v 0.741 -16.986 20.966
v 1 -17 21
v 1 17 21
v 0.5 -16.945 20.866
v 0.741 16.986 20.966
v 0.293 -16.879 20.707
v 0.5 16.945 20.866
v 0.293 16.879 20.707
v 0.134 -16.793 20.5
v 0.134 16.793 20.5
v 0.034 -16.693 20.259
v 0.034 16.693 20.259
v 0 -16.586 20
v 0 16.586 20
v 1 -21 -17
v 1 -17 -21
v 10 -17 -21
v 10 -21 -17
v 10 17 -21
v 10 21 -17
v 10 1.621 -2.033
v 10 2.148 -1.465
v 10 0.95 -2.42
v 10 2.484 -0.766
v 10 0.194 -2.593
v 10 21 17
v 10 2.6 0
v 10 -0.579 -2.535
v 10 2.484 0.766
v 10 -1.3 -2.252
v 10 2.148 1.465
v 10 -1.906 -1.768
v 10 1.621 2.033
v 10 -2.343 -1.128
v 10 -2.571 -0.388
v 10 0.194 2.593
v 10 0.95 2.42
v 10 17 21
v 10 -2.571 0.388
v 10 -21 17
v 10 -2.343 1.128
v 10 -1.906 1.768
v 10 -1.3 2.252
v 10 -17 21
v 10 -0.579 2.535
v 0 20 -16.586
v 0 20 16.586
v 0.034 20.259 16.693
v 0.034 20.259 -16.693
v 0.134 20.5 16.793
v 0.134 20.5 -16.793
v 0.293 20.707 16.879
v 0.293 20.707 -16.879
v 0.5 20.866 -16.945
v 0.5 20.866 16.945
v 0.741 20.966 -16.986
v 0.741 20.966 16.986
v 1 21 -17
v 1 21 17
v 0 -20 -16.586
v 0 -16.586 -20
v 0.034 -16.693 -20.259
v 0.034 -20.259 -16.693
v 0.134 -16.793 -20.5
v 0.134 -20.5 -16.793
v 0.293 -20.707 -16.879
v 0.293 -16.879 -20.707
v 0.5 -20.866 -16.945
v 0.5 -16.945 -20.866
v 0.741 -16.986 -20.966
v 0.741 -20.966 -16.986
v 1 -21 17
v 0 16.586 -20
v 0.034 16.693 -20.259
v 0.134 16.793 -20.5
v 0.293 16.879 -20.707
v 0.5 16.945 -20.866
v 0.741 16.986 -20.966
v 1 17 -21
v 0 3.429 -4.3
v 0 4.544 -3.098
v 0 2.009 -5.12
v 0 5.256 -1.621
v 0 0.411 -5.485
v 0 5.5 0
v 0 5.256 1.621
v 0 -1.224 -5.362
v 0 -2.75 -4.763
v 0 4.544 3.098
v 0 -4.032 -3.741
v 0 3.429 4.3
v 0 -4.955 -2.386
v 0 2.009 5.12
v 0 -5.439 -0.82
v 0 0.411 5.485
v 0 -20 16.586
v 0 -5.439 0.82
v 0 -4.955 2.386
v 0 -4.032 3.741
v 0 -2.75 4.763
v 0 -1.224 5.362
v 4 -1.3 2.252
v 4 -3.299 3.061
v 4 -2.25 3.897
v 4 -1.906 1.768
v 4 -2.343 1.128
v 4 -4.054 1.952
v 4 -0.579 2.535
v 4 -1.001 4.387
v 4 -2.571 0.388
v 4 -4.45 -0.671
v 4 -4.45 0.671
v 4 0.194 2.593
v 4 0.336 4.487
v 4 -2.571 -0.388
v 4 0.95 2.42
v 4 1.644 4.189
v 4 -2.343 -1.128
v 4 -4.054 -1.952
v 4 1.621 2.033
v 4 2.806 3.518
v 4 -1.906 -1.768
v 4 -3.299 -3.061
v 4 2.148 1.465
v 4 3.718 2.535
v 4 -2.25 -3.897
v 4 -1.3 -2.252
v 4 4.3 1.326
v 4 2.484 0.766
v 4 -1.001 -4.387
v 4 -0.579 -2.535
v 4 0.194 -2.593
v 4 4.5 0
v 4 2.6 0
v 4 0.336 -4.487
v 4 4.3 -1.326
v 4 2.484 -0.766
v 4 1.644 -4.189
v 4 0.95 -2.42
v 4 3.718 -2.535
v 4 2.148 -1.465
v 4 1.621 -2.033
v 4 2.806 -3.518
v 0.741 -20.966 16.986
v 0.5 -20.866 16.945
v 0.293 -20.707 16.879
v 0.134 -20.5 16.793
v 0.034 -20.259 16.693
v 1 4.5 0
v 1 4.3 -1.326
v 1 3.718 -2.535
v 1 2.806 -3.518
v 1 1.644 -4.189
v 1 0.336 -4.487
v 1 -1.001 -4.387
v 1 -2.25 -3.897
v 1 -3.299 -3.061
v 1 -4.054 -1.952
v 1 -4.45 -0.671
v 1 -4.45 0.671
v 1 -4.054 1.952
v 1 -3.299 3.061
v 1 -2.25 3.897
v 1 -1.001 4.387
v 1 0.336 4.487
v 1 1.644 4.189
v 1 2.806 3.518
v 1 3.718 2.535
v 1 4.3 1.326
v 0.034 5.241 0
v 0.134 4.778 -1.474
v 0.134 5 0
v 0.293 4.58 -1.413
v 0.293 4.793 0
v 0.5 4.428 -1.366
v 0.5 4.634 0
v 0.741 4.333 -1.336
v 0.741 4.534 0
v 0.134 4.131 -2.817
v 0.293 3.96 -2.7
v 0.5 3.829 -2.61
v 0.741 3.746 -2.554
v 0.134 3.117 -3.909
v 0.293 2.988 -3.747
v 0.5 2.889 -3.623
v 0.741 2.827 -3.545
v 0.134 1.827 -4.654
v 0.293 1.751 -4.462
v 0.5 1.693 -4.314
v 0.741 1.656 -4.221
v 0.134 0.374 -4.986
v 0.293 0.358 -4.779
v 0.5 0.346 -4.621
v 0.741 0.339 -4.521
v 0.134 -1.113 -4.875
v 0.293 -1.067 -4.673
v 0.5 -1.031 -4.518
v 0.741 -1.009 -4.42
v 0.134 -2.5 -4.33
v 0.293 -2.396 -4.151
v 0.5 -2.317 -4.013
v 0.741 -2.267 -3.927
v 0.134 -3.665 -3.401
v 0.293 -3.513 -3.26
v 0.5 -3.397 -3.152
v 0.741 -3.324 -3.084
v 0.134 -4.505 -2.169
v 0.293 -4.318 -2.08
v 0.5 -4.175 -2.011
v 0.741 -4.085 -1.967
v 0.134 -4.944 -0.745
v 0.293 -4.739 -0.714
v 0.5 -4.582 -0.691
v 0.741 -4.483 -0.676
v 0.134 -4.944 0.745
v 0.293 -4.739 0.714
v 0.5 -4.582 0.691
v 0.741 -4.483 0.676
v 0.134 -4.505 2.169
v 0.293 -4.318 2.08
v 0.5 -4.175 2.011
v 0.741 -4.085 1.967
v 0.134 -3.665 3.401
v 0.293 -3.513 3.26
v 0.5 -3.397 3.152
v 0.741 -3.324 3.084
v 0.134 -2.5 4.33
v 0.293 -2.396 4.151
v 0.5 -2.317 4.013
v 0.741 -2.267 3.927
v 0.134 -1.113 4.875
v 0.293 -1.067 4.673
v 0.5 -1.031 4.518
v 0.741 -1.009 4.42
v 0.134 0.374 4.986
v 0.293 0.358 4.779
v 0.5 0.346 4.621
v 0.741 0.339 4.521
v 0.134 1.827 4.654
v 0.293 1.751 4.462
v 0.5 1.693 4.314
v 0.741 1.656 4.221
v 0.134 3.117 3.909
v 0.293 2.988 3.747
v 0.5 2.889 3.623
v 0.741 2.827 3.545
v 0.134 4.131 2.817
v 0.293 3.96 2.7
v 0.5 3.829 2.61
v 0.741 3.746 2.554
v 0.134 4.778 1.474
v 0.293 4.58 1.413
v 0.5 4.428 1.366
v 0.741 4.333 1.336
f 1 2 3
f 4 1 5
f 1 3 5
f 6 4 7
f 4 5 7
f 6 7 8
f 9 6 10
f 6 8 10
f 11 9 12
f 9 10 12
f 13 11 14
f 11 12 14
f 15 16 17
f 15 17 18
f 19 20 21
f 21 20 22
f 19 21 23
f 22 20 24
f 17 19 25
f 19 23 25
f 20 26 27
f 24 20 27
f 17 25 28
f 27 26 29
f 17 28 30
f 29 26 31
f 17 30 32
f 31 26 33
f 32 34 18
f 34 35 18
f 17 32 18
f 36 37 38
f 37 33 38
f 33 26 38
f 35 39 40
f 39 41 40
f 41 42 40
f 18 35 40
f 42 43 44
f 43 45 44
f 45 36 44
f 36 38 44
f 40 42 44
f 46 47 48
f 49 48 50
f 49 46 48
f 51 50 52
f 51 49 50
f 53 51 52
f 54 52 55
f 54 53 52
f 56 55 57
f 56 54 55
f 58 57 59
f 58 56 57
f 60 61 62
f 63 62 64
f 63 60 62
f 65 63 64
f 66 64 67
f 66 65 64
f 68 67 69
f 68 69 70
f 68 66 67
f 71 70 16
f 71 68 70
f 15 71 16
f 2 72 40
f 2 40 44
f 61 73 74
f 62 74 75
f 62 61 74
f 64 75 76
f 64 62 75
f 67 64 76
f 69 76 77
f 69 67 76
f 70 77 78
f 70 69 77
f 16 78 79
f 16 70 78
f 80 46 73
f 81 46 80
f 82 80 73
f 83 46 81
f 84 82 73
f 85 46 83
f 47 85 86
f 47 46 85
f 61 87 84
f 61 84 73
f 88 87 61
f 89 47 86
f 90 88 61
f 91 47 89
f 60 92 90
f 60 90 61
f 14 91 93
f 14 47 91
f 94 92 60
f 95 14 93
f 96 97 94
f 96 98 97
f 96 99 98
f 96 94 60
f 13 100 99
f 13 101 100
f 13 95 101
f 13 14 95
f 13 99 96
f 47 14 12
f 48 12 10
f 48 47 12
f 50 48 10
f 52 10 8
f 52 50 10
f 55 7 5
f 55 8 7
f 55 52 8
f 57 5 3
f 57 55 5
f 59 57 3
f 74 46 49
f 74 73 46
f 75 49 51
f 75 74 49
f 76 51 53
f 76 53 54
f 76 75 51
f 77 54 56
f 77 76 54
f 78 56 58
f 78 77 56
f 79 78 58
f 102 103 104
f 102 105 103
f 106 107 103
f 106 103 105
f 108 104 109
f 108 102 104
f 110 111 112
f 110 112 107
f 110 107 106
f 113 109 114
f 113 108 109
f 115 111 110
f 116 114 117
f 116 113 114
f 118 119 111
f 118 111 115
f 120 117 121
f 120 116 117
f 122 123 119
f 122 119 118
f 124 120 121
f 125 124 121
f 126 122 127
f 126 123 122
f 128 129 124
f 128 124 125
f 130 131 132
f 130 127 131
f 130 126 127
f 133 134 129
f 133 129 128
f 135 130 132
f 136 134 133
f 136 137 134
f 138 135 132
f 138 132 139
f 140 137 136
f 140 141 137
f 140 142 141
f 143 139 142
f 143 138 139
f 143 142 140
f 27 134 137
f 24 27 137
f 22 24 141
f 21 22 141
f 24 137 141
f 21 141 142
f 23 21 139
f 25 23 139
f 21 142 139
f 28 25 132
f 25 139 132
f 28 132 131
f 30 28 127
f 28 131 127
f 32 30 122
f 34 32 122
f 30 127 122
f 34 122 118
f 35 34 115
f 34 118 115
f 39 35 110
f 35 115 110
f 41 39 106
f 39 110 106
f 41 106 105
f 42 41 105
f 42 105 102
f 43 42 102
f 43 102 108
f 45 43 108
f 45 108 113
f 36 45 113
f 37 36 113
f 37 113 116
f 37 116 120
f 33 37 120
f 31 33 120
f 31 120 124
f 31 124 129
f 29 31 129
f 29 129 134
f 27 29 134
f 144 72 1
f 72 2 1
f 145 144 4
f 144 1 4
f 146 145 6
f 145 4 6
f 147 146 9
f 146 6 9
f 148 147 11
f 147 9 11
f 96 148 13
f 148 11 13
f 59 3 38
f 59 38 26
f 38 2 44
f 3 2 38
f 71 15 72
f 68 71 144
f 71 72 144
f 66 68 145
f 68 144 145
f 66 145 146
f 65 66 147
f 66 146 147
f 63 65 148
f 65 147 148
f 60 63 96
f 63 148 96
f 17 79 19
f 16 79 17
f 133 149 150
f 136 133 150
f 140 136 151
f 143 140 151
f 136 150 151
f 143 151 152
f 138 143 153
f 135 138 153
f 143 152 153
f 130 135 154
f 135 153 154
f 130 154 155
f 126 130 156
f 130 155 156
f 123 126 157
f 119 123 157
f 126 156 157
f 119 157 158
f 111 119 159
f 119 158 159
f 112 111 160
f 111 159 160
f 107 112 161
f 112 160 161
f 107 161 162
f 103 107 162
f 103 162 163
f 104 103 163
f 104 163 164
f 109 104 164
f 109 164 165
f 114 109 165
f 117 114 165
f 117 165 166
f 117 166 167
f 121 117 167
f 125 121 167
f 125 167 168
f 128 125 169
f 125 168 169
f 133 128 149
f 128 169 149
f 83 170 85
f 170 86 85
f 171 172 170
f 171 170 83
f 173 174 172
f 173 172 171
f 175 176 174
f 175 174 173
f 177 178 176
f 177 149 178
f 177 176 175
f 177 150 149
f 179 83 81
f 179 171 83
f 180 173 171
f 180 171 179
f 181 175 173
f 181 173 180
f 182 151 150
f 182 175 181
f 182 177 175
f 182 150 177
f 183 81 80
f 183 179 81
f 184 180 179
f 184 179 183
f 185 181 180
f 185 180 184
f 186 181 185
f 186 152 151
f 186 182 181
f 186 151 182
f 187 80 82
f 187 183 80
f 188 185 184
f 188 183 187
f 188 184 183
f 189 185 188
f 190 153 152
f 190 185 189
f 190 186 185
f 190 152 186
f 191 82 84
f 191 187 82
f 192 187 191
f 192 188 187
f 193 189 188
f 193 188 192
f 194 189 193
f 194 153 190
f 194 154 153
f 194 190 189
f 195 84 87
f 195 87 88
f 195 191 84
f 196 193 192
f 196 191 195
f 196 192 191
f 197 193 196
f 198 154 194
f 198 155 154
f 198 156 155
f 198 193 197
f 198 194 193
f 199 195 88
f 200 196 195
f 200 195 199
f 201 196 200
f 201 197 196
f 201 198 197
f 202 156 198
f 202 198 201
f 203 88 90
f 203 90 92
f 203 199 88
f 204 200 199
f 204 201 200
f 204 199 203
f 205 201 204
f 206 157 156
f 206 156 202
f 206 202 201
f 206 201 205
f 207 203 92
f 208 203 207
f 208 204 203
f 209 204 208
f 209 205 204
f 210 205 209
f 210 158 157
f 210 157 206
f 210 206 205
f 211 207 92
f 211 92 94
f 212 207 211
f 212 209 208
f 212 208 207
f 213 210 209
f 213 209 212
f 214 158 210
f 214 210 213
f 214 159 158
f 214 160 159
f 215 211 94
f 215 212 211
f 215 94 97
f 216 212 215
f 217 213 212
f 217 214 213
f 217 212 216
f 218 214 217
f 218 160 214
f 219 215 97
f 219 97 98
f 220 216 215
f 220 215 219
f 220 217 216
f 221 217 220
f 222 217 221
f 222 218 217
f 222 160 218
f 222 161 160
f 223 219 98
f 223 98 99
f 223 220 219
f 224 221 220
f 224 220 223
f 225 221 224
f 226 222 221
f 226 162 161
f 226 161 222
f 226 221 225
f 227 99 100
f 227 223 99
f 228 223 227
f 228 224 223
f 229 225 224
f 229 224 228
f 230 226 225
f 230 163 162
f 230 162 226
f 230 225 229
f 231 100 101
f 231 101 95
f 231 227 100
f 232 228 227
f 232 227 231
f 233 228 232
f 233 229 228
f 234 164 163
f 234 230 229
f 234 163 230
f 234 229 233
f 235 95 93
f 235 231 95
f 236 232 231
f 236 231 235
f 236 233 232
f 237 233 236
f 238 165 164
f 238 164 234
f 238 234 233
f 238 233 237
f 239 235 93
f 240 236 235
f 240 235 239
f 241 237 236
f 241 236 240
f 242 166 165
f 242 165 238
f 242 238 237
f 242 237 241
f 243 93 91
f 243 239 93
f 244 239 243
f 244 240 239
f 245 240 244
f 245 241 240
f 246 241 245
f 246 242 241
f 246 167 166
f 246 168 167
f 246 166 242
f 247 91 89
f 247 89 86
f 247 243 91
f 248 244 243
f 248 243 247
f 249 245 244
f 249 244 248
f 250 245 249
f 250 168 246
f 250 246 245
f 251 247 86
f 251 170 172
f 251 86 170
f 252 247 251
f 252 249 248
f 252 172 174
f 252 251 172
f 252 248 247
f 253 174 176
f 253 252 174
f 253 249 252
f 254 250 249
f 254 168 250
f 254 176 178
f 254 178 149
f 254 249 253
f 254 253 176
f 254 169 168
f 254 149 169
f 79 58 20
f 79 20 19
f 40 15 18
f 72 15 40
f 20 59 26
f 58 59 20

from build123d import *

# Parameters (mm, degrees)
PAD002_DEPTH    = 10
SKETCH008_R     = 4.5
POCKET003_DEPTH = 4
SKETCH009_R     = 2.6
POCKET004_DEPTH = 6.001
FILLET001_R     = 1


with BuildPart() as part:
    # Sketch007 → Pad002 (new body)
    with BuildSketch(Plane.YZ):
        Polygon((-21, 17), (-17, 21), (17, 21), (21, 17), (21, -17), (17, -21), (-17, -21), (-21, -17), align=None)
    extrude(amount=PAD002_DEPTH)

    # Sketch008 (on Face9 of Pad002) → Pocket003 (cut)
    with BuildSketch(Plane(origin=(0, 0, 0), x_dir=(0, 1, 0), z_dir=(-1, 0, 0))):
        Circle(SKETCH008_R)
    extrude(amount=-POCKET003_DEPTH, mode=Mode.SUBTRACT)

    # Sketch009 (on Face12 of Pocket003) → Pocket004 (cut, through all)
    with BuildSketch(Plane(origin=(4, 0, 0), x_dir=(0, 1, 0), z_dir=(-1, 0, 0))):
        Circle(SKETCH009_R)
    extrude(amount=-POCKET004_DEPTH, mode=Mode.SUBTRACT)

    # Fillet001
    fillet001_edges = [part.edges().sort_by_distance(p)[0] for p in [
        (0, -19, 19),
        (0, -21, 0),
        (0, 0, 21),
        (0, -19, -19),
        (0, 19, 19),
        (0, 0, -21),
        (0, 21, 0),
        (0, 19, -19),
        (0, -4.5, 0),
    ]]
    fillet(fillet001_edges, radius=FILLET001_R)


solid = part.part
